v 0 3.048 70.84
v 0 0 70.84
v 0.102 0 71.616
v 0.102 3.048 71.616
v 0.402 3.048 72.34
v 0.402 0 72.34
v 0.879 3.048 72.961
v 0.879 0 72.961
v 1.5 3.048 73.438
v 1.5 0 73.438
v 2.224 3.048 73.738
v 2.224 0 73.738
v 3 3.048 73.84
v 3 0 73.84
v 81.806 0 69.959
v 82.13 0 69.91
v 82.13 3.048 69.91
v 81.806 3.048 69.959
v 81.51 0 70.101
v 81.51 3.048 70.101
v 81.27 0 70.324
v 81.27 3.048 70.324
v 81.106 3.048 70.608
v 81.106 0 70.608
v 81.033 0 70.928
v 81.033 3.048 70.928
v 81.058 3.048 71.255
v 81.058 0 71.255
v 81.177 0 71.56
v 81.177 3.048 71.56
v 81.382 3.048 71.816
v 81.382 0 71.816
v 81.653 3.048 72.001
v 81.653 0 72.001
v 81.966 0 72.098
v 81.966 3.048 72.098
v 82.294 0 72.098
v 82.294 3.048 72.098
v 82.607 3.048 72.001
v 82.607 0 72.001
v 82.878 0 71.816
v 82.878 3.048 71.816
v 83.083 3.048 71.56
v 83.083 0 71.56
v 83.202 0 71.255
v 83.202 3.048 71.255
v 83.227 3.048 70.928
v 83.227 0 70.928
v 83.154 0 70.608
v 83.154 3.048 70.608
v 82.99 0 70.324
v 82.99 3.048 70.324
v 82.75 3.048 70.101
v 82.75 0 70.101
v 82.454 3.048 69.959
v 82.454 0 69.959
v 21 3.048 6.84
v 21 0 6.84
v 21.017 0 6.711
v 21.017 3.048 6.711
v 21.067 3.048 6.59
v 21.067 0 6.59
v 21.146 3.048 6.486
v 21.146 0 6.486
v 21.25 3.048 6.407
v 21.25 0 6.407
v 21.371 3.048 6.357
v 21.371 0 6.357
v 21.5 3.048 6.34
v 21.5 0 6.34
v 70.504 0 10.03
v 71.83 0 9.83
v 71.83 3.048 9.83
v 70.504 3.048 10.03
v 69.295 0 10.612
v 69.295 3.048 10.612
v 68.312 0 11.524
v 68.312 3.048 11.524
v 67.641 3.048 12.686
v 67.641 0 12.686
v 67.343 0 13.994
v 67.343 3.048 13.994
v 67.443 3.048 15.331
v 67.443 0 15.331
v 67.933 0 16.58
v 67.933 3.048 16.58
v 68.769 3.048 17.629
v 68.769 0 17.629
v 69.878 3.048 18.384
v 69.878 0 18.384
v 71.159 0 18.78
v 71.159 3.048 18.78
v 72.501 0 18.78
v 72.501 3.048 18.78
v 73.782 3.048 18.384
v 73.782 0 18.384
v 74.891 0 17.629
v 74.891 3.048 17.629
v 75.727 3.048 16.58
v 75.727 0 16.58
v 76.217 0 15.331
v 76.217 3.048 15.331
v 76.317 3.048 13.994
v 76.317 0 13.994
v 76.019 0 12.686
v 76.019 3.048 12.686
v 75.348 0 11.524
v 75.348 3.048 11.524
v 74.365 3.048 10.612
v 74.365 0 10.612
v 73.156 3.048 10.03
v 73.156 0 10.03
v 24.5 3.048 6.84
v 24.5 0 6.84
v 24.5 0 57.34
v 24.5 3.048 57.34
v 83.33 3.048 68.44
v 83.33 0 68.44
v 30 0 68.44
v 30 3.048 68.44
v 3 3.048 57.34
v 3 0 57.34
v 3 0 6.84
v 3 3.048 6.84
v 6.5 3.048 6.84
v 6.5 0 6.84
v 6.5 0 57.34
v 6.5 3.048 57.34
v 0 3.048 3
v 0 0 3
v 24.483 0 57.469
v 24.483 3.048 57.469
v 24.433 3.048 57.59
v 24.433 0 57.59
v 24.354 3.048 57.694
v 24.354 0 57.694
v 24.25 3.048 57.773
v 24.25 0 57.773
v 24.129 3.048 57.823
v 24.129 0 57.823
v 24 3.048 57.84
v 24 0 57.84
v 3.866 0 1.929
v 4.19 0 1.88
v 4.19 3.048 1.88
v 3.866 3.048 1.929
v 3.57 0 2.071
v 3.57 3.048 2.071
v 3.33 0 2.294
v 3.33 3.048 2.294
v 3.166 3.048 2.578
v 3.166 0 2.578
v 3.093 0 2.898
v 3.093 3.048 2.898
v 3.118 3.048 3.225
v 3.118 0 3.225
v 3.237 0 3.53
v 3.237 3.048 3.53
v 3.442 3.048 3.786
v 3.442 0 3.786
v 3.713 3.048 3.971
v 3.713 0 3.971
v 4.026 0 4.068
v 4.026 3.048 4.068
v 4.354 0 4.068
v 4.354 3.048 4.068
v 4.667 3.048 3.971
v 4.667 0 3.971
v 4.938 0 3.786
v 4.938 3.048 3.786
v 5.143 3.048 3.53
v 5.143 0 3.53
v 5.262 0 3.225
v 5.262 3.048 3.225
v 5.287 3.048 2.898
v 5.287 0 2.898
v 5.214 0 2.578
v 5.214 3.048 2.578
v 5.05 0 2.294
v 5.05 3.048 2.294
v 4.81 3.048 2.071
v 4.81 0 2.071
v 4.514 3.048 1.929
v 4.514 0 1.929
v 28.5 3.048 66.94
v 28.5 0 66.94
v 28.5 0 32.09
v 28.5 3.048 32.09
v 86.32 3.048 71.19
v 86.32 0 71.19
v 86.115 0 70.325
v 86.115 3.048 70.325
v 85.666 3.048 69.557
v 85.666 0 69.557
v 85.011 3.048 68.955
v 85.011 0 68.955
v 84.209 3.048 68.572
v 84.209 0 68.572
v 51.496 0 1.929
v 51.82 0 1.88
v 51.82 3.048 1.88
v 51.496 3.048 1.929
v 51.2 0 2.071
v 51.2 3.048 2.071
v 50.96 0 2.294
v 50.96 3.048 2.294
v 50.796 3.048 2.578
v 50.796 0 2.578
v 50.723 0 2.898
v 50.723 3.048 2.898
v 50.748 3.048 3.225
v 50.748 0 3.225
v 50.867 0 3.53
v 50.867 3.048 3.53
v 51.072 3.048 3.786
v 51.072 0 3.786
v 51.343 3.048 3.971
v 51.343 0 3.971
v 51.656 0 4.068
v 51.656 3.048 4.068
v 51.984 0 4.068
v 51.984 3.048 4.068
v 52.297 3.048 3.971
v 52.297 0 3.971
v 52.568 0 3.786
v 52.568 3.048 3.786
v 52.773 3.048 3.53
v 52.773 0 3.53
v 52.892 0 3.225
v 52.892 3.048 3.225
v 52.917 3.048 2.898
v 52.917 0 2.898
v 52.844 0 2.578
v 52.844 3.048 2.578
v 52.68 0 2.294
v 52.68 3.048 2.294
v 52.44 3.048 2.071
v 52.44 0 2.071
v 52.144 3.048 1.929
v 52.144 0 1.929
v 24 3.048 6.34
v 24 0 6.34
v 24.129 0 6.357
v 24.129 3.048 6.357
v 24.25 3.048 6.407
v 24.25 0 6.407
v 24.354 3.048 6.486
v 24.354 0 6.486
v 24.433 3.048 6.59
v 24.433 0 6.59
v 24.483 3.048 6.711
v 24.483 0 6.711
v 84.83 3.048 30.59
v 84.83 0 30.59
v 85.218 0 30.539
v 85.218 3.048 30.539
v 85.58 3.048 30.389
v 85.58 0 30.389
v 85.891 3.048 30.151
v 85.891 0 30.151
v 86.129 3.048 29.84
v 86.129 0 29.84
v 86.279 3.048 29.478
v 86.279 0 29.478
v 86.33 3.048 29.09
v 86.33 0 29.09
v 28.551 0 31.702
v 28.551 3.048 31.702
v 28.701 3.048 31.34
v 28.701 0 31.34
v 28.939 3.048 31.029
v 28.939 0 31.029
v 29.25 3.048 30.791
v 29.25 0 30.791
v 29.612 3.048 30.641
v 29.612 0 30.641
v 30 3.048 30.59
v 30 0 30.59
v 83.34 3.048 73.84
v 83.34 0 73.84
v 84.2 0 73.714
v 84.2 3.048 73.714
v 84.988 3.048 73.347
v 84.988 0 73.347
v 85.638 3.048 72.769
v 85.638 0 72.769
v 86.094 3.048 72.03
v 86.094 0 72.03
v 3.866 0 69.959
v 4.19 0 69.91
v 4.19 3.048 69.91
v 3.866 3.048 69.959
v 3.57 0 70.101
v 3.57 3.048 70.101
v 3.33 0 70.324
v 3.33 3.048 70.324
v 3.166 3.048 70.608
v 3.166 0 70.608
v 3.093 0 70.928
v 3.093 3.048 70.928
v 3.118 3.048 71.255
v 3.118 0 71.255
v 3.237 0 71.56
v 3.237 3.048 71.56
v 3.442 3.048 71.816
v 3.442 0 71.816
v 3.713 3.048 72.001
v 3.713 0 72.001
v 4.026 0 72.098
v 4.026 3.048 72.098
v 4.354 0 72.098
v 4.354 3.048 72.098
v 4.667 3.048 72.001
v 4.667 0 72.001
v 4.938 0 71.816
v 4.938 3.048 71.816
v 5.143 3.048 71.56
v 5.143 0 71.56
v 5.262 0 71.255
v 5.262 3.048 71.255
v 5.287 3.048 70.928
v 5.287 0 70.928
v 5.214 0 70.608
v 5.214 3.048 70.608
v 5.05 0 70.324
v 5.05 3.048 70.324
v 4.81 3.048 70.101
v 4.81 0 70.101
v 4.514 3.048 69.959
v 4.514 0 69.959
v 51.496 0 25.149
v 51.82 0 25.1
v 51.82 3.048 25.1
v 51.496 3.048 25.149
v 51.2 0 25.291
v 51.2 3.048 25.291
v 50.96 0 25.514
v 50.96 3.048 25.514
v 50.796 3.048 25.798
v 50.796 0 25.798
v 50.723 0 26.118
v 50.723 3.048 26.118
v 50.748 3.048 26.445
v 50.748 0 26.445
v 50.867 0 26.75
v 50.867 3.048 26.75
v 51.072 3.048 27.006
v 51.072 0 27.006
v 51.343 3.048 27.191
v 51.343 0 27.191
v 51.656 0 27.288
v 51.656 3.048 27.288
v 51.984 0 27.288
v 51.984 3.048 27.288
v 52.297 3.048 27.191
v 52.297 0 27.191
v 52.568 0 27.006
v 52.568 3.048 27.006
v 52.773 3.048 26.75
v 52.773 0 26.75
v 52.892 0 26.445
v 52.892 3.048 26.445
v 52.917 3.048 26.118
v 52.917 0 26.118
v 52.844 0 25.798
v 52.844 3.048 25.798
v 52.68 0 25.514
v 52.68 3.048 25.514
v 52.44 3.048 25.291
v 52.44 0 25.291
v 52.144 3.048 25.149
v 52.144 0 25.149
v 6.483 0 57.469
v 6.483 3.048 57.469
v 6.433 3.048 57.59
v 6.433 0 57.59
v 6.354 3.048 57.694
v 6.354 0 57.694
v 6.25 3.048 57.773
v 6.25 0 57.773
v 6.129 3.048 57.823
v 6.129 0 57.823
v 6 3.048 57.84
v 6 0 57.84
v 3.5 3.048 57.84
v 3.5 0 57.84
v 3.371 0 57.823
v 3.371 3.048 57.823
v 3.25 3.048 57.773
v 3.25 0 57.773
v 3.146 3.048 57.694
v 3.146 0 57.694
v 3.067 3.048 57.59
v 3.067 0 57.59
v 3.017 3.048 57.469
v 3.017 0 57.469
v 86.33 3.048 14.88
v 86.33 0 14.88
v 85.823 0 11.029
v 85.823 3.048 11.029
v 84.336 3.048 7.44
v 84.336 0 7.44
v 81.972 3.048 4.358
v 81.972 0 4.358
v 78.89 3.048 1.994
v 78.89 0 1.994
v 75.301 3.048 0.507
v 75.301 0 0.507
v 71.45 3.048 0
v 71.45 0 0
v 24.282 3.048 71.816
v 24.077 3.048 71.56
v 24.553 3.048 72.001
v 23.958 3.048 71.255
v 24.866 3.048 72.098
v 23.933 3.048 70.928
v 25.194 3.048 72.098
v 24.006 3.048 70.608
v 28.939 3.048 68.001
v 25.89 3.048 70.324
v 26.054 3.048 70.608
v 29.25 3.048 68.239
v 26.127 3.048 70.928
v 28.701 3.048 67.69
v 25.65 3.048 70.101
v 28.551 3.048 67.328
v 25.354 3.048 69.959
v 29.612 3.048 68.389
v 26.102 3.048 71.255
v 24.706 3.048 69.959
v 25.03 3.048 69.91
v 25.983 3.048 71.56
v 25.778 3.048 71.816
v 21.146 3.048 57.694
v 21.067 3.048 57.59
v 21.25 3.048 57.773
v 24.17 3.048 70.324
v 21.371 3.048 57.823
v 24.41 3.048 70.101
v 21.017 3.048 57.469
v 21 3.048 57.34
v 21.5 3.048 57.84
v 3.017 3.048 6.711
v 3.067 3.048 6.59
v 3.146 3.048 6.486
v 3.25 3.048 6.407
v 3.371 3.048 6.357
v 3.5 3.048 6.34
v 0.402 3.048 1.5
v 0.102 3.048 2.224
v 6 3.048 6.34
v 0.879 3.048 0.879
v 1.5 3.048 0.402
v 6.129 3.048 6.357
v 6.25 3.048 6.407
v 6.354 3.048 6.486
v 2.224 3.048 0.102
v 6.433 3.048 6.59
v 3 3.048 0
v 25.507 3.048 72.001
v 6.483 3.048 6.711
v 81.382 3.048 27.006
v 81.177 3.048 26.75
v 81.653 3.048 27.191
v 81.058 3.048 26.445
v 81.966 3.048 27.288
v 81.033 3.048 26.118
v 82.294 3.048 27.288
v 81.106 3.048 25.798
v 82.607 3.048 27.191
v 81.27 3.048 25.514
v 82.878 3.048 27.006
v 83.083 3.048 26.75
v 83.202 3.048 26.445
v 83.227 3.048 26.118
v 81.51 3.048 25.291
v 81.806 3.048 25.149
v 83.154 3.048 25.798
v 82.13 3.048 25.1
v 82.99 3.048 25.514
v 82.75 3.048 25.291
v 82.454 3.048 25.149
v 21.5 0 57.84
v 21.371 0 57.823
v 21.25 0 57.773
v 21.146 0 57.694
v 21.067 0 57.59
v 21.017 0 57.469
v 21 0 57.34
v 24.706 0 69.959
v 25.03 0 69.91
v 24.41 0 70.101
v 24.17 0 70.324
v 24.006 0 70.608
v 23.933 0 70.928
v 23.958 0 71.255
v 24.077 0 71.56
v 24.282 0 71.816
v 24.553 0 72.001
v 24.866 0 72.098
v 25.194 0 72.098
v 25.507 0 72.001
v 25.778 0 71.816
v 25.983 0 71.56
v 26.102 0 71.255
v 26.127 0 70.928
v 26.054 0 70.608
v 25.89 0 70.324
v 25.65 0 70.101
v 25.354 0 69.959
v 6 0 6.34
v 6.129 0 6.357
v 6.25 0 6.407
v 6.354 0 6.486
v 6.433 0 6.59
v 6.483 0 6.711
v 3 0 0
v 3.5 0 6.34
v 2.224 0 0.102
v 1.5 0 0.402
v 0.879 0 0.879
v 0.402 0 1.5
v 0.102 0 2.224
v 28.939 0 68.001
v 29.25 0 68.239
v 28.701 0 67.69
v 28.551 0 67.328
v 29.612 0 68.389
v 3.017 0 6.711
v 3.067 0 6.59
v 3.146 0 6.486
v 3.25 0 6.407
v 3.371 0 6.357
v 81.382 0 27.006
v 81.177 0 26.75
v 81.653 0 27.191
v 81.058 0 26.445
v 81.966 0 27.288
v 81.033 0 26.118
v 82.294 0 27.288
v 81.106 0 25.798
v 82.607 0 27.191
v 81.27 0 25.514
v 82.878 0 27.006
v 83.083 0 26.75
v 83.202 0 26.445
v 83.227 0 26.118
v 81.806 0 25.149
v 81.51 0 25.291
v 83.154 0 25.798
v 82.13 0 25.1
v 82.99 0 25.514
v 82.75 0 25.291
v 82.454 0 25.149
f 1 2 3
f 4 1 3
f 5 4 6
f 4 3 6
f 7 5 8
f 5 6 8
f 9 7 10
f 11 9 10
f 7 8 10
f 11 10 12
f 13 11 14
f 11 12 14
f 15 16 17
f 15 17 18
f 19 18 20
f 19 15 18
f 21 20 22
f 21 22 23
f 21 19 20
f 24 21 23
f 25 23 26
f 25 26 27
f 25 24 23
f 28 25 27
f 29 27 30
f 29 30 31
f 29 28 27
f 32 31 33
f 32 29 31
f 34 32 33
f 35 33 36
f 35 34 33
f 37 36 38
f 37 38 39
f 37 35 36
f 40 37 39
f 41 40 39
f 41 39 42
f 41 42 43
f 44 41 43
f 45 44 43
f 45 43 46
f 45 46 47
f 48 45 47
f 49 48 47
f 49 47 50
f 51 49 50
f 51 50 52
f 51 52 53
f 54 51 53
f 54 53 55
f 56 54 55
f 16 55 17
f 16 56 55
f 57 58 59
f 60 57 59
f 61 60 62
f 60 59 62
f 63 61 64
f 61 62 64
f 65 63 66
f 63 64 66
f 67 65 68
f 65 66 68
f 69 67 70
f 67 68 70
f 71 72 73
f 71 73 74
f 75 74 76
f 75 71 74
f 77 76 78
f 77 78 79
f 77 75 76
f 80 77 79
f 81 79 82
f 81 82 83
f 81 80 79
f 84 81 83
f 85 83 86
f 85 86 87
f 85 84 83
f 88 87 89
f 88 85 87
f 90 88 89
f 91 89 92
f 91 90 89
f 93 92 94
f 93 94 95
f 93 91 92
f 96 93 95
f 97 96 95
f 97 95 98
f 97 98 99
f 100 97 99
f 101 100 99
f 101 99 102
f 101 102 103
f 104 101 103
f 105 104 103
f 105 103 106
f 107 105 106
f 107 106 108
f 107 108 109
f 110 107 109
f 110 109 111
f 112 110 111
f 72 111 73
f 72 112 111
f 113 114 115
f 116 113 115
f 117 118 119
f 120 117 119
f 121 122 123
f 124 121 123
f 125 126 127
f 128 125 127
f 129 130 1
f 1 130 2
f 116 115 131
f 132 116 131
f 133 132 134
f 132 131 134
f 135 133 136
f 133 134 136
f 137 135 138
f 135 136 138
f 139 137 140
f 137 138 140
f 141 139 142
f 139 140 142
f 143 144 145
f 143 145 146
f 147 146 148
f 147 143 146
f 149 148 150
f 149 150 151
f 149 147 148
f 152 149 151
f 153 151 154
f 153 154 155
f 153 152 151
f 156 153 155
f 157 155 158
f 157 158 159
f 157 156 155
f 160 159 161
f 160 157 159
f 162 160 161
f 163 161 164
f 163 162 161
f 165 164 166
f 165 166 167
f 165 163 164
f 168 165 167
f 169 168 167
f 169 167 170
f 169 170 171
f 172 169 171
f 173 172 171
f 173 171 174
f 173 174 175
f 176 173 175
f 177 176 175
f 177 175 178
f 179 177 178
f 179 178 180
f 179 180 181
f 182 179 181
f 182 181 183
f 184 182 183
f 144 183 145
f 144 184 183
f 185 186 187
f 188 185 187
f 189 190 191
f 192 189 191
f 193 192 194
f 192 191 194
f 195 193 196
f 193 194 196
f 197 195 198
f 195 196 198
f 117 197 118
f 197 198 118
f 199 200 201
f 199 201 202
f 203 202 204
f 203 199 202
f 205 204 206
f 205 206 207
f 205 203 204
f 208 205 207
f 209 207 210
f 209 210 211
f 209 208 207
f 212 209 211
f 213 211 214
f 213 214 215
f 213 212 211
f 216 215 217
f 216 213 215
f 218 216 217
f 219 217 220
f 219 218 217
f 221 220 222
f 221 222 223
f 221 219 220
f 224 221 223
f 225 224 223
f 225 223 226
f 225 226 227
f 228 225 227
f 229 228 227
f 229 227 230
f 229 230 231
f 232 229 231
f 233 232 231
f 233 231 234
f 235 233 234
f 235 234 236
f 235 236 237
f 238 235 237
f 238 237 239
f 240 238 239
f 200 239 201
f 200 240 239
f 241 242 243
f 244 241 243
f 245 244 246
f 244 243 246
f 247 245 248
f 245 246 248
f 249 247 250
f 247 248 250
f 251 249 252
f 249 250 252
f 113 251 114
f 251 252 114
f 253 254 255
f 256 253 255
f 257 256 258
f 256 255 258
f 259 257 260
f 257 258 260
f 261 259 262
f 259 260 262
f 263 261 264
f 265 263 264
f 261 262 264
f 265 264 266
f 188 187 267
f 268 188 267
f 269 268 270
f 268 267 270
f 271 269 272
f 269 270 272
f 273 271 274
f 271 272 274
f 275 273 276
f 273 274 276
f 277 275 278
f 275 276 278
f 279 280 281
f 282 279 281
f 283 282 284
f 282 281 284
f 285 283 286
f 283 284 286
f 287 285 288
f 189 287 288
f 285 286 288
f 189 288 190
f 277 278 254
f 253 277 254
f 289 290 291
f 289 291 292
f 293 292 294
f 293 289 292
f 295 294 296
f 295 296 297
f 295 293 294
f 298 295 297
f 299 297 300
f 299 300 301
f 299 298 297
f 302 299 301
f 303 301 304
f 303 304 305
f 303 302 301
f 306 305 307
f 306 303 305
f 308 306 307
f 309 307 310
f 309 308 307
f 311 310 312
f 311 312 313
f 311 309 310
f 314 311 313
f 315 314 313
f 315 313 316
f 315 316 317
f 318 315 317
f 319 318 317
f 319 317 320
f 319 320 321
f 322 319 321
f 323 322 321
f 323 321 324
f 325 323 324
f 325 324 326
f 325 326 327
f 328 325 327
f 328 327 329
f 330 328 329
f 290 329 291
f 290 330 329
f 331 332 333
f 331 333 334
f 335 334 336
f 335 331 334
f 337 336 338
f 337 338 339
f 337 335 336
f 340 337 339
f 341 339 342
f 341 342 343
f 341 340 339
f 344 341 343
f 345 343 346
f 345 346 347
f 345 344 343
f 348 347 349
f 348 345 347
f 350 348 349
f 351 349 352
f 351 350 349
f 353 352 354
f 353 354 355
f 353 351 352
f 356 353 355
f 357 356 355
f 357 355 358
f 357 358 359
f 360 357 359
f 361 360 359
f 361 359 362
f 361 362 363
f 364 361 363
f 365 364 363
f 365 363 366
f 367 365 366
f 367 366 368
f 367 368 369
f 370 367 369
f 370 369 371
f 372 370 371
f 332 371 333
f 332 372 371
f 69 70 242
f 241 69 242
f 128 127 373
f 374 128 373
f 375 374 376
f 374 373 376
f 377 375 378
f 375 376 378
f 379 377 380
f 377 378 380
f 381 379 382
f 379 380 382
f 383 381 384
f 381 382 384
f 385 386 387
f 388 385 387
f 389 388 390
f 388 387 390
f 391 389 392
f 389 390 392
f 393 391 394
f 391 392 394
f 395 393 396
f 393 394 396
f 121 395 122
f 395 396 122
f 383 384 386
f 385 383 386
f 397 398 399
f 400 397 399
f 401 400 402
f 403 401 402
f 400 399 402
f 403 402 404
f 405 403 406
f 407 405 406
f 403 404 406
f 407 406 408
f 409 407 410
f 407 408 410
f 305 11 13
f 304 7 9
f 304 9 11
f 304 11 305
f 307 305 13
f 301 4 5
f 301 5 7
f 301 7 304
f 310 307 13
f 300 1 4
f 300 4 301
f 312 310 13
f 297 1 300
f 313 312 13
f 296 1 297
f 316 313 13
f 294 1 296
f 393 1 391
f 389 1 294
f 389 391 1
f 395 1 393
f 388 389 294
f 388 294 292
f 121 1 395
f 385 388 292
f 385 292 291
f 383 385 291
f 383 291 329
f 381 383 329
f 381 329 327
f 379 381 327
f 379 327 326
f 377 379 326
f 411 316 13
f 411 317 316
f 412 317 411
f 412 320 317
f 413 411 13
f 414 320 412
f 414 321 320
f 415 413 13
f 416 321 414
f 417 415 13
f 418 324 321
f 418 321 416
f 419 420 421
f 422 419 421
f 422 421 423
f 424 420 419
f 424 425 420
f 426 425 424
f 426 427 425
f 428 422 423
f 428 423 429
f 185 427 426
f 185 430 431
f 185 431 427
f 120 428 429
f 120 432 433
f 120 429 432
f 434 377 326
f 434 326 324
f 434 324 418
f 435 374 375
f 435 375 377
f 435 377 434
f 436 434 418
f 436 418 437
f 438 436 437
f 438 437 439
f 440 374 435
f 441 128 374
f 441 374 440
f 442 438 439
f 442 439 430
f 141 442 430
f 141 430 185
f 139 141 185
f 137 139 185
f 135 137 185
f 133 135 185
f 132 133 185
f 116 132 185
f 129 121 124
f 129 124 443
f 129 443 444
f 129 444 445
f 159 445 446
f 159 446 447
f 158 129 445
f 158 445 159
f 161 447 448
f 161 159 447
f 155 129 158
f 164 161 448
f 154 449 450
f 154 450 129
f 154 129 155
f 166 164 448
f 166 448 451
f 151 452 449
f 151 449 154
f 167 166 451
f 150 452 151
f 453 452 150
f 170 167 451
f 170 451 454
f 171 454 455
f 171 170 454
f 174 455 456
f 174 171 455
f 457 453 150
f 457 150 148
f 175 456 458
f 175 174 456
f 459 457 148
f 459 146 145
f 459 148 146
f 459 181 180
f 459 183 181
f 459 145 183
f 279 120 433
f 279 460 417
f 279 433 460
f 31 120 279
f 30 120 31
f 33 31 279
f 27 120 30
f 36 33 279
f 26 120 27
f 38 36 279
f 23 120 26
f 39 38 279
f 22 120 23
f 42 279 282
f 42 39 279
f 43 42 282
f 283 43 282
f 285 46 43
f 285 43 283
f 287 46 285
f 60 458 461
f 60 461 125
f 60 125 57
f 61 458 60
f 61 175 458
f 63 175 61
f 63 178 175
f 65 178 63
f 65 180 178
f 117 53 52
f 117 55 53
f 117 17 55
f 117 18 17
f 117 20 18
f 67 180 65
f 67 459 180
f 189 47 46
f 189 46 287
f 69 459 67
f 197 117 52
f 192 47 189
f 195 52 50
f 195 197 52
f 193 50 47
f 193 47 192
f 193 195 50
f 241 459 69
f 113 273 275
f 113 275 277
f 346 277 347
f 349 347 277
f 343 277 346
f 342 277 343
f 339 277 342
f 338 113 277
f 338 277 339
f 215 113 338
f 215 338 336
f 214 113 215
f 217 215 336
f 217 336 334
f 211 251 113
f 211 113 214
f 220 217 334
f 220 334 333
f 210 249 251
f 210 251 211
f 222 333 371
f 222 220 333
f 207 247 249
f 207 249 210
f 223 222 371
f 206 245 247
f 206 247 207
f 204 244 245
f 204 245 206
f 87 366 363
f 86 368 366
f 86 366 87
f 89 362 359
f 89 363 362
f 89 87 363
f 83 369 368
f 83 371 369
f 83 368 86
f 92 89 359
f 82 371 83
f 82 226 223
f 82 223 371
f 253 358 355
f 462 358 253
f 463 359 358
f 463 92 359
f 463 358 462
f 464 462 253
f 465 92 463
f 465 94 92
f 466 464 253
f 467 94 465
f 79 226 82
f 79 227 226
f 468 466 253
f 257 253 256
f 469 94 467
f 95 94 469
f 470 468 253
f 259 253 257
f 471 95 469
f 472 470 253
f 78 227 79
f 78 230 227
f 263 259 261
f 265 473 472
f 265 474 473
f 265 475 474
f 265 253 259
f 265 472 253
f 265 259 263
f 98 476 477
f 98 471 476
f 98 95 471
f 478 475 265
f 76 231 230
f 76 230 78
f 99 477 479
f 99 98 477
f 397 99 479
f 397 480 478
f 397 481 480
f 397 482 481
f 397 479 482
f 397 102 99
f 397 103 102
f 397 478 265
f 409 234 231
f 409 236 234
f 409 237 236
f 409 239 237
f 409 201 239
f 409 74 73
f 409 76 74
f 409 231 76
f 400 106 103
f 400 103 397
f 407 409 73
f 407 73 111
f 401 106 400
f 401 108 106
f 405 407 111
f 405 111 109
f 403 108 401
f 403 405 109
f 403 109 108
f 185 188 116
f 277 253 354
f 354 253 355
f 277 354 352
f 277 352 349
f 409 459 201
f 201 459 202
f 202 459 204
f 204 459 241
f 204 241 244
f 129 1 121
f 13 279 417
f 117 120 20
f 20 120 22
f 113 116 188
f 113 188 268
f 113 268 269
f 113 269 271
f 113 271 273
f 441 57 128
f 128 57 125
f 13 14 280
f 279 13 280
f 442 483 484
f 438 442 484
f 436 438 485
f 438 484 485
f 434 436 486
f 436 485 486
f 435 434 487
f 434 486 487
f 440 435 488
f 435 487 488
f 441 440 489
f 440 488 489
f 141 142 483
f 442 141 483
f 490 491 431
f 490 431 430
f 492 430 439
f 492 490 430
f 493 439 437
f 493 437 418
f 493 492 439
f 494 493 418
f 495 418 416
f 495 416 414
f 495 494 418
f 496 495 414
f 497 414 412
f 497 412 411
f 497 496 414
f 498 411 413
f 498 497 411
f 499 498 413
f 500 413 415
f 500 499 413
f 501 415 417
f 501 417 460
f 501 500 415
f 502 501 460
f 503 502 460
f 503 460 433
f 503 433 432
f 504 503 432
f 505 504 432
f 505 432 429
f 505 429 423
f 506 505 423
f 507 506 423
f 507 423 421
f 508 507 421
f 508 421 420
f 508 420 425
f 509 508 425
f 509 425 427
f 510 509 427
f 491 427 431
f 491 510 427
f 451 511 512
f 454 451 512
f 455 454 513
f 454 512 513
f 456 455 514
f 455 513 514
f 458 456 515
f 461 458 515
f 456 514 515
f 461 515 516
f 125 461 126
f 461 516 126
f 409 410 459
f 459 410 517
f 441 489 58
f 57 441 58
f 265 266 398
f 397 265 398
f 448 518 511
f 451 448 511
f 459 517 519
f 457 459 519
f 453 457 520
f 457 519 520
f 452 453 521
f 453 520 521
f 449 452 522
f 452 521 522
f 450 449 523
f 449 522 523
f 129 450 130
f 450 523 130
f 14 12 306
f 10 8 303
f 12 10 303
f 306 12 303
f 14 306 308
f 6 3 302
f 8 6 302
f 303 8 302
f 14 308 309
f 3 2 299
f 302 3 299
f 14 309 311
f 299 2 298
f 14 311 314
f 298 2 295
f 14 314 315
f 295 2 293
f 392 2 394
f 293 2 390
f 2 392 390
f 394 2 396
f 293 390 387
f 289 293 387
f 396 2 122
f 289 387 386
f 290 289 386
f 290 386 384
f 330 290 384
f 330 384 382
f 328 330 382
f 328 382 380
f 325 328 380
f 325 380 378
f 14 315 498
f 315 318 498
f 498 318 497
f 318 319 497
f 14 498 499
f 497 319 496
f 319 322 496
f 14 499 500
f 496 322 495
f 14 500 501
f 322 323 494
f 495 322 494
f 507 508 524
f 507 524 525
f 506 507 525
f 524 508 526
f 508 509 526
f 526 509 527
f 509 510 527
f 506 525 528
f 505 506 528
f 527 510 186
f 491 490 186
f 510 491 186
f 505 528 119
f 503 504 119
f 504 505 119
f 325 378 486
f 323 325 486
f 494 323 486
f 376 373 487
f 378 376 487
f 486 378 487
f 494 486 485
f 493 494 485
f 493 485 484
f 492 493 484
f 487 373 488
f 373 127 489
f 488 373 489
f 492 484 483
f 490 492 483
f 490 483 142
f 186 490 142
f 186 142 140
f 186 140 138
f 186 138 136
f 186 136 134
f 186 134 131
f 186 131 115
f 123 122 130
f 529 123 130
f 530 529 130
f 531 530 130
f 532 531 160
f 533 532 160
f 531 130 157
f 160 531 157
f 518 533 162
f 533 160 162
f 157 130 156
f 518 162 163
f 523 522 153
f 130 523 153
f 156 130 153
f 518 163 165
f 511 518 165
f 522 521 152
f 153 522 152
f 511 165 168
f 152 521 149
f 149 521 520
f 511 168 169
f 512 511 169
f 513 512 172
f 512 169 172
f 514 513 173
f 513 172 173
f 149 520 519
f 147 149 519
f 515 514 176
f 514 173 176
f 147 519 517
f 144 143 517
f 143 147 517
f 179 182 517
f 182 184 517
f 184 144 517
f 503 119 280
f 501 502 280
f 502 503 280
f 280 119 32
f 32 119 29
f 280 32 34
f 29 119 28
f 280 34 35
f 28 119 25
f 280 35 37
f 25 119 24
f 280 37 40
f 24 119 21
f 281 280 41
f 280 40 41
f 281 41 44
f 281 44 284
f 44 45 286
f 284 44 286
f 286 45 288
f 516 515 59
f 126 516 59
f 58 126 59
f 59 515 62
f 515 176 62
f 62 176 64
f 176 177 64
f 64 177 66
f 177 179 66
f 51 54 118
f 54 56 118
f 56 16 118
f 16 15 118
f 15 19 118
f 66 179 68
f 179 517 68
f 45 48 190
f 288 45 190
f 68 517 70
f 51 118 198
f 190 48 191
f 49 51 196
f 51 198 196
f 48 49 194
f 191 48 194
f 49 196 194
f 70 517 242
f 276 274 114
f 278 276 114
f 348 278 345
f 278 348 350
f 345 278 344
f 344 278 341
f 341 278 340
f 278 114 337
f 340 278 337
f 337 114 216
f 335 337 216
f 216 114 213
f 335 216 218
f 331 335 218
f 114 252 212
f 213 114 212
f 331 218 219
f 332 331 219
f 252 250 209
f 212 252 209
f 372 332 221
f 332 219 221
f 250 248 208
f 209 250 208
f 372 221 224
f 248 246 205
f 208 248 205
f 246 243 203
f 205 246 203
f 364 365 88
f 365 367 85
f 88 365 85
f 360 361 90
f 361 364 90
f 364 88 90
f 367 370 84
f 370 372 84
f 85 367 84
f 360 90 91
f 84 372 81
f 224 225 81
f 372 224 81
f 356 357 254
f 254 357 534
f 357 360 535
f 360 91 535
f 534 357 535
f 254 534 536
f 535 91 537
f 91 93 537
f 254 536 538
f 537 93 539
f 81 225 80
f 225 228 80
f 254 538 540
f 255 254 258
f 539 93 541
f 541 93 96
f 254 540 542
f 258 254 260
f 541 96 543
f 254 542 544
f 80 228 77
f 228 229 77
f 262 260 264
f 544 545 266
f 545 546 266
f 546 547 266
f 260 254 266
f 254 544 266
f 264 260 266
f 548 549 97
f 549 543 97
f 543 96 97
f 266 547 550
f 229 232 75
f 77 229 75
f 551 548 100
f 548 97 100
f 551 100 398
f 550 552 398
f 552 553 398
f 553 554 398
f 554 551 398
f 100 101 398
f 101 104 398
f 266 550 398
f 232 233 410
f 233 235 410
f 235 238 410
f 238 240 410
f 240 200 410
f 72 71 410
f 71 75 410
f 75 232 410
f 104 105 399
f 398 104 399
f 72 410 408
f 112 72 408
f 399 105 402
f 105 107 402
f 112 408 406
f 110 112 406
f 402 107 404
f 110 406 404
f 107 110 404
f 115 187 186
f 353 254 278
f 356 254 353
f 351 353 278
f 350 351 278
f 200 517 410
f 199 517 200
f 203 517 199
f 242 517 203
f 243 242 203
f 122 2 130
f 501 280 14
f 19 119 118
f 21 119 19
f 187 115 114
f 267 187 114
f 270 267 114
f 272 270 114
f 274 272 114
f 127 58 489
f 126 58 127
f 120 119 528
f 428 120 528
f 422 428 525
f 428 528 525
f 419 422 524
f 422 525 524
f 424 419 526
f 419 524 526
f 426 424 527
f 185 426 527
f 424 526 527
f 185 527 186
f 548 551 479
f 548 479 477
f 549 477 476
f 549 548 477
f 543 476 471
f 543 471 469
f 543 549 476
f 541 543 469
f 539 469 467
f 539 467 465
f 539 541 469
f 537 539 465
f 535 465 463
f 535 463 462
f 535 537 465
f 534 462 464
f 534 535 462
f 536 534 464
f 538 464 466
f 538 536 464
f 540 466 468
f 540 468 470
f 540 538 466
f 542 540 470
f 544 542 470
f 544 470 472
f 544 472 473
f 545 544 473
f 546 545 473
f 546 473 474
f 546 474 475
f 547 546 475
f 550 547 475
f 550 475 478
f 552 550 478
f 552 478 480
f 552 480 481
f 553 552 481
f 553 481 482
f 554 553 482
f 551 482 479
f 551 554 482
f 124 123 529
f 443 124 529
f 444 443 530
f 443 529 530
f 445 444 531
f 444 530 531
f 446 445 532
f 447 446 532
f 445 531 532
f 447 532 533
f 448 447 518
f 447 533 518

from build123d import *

# Parameters (mm, degrees)
SKETCH2_R           = 1.1
SKETCH2_R_2         = 4.5
BOSS_EXTRUDE1_DEPTH = 3.048


with BuildPart() as part:
    # Sketch2 → Boss-Extrude1 (new body)
    with BuildSketch(Plane(origin=(0, 0, 0), x_dir=(1, 0, 0), z_dir=(0, 1, 0))):
        with BuildLine():
            Line((28.5, -66.94), (28.5, -32.09))
            ThreePointArc((28.5, -32.09), (28.939339828, -31.029339828), (30, -30.59))
            Line((30, -30.59), (84.83, -30.59))
            ThreePointArc((84.83, -30.59), (85.890660172, -30.150660172), (86.33, -29.09))
            Line((86.33, -29.09), (86.33, -14.88))
            ThreePointArc((86.33, -14.88), (81.971748904, -4.358251096), (71.45, 0))
            Line((71.45, 0), (3, 0))
            ThreePointArc((3, 0), (0.878679656, -0.878679656), (0, -3))
            Line((0, -3), (0, -70.84))
            ThreePointArc((0, -70.84), (0.878679656, -72.961320344), (3, -73.84))
            Line((3, -73.84), (83.340051803, -73.84))
            ThreePointArc((83.340051803, -73.84), (85.333792006, -73.081651177), (86.319565186, -71.19))
            ThreePointArc((86.319565186, -71.19), (85.361009601, -69.232059783), (83.33, -68.44))
            Line((83.33, -68.44), (30, -68.44))
            ThreePointArc((30, -68.44), (28.939339828, -68.000660172), (28.5, -66.94))
        make_face()
        with Locations(Location((4.19, -71.01, 0), (0, 0, 90))):
            Circle(SKETCH2_R, mode=Mode.SUBTRACT)
        with Locations(Location((25.03, -71.01, 0), (0, 0, 90))):
            Circle(SKETCH2_R, mode=Mode.SUBTRACT)
        with Locations(Location((4.19, -2.98, 0), (0, 0, 90))):
            Circle(SKETCH2_R, mode=Mode.SUBTRACT)
        with Locations(Location((51.82, -2.98, 0), (0, 0, 90))):
            Circle(SKETCH2_R, mode=Mode.SUBTRACT)
        with Locations(Location((51.82, -26.2, 0), (0, 0, 90))):
            Circle(SKETCH2_R, mode=Mode.SUBTRACT)
        with Locations(Location((82.13, -71.01, 0), (0, 0, 90))):
            Circle(SKETCH2_R, mode=Mode.SUBTRACT)
        with Locations(Location((82.13, -26.2, 0), (0, 0, 90))):
            Circle(SKETCH2_R, mode=Mode.SUBTRACT)
        with Locations(Location((71.83, -14.33, 0), (0, 0, 90))):
            Circle(SKETCH2_R_2, mode=Mode.SUBTRACT)
        with BuildLine():
            Line((6.5, -6.84), (6.5, -57.34))
            ThreePointArc((6.5, -57.34), (6.353553391, -57.693553391), (6, -57.84))
            Line((6, -57.84), (3.5, -57.84))
            ThreePointArc((3.5, -57.84), (3.146446609, -57.693553391), (3, -57.34))
            Line((3, -57.34), (3, -6.84))
            ThreePointArc((3, -6.84), (3.146446609, -6.486446609), (3.5, -6.34))
            Line((3.5, -6.34), (6, -6.34))
            ThreePointArc((6, -6.34), (6.353553391, -6.486446609), (6.5, -6.84))
        make_face(mode=Mode.SUBTRACT)
        with BuildLine():
            Line((24.5, -6.84), (24.5, -57.34))
            ThreePointArc((24.5, -57.34), (24.353553391, -57.693553391), (24, -57.84))
            Line((24, -57.84), (21.5, -57.84))
            ThreePointArc((21.5, -57.84), (21.146446609, -57.693553391), (21, -57.34))
            Line((21, -57.34), (21, -6.84))
            ThreePointArc((21, -6.84), (21.146446609, -6.486446609), (21.5, -6.34))
            Line((21.5, -6.34), (24, -6.34))
            ThreePointArc((24, -6.34), (24.353553391, -6.486446609), (24.5, -6.84))
        make_face(mode=Mode.SUBTRACT)
    extrude(amount=BOSS_EXTRUDE1_DEPTH)


solid = part.part
